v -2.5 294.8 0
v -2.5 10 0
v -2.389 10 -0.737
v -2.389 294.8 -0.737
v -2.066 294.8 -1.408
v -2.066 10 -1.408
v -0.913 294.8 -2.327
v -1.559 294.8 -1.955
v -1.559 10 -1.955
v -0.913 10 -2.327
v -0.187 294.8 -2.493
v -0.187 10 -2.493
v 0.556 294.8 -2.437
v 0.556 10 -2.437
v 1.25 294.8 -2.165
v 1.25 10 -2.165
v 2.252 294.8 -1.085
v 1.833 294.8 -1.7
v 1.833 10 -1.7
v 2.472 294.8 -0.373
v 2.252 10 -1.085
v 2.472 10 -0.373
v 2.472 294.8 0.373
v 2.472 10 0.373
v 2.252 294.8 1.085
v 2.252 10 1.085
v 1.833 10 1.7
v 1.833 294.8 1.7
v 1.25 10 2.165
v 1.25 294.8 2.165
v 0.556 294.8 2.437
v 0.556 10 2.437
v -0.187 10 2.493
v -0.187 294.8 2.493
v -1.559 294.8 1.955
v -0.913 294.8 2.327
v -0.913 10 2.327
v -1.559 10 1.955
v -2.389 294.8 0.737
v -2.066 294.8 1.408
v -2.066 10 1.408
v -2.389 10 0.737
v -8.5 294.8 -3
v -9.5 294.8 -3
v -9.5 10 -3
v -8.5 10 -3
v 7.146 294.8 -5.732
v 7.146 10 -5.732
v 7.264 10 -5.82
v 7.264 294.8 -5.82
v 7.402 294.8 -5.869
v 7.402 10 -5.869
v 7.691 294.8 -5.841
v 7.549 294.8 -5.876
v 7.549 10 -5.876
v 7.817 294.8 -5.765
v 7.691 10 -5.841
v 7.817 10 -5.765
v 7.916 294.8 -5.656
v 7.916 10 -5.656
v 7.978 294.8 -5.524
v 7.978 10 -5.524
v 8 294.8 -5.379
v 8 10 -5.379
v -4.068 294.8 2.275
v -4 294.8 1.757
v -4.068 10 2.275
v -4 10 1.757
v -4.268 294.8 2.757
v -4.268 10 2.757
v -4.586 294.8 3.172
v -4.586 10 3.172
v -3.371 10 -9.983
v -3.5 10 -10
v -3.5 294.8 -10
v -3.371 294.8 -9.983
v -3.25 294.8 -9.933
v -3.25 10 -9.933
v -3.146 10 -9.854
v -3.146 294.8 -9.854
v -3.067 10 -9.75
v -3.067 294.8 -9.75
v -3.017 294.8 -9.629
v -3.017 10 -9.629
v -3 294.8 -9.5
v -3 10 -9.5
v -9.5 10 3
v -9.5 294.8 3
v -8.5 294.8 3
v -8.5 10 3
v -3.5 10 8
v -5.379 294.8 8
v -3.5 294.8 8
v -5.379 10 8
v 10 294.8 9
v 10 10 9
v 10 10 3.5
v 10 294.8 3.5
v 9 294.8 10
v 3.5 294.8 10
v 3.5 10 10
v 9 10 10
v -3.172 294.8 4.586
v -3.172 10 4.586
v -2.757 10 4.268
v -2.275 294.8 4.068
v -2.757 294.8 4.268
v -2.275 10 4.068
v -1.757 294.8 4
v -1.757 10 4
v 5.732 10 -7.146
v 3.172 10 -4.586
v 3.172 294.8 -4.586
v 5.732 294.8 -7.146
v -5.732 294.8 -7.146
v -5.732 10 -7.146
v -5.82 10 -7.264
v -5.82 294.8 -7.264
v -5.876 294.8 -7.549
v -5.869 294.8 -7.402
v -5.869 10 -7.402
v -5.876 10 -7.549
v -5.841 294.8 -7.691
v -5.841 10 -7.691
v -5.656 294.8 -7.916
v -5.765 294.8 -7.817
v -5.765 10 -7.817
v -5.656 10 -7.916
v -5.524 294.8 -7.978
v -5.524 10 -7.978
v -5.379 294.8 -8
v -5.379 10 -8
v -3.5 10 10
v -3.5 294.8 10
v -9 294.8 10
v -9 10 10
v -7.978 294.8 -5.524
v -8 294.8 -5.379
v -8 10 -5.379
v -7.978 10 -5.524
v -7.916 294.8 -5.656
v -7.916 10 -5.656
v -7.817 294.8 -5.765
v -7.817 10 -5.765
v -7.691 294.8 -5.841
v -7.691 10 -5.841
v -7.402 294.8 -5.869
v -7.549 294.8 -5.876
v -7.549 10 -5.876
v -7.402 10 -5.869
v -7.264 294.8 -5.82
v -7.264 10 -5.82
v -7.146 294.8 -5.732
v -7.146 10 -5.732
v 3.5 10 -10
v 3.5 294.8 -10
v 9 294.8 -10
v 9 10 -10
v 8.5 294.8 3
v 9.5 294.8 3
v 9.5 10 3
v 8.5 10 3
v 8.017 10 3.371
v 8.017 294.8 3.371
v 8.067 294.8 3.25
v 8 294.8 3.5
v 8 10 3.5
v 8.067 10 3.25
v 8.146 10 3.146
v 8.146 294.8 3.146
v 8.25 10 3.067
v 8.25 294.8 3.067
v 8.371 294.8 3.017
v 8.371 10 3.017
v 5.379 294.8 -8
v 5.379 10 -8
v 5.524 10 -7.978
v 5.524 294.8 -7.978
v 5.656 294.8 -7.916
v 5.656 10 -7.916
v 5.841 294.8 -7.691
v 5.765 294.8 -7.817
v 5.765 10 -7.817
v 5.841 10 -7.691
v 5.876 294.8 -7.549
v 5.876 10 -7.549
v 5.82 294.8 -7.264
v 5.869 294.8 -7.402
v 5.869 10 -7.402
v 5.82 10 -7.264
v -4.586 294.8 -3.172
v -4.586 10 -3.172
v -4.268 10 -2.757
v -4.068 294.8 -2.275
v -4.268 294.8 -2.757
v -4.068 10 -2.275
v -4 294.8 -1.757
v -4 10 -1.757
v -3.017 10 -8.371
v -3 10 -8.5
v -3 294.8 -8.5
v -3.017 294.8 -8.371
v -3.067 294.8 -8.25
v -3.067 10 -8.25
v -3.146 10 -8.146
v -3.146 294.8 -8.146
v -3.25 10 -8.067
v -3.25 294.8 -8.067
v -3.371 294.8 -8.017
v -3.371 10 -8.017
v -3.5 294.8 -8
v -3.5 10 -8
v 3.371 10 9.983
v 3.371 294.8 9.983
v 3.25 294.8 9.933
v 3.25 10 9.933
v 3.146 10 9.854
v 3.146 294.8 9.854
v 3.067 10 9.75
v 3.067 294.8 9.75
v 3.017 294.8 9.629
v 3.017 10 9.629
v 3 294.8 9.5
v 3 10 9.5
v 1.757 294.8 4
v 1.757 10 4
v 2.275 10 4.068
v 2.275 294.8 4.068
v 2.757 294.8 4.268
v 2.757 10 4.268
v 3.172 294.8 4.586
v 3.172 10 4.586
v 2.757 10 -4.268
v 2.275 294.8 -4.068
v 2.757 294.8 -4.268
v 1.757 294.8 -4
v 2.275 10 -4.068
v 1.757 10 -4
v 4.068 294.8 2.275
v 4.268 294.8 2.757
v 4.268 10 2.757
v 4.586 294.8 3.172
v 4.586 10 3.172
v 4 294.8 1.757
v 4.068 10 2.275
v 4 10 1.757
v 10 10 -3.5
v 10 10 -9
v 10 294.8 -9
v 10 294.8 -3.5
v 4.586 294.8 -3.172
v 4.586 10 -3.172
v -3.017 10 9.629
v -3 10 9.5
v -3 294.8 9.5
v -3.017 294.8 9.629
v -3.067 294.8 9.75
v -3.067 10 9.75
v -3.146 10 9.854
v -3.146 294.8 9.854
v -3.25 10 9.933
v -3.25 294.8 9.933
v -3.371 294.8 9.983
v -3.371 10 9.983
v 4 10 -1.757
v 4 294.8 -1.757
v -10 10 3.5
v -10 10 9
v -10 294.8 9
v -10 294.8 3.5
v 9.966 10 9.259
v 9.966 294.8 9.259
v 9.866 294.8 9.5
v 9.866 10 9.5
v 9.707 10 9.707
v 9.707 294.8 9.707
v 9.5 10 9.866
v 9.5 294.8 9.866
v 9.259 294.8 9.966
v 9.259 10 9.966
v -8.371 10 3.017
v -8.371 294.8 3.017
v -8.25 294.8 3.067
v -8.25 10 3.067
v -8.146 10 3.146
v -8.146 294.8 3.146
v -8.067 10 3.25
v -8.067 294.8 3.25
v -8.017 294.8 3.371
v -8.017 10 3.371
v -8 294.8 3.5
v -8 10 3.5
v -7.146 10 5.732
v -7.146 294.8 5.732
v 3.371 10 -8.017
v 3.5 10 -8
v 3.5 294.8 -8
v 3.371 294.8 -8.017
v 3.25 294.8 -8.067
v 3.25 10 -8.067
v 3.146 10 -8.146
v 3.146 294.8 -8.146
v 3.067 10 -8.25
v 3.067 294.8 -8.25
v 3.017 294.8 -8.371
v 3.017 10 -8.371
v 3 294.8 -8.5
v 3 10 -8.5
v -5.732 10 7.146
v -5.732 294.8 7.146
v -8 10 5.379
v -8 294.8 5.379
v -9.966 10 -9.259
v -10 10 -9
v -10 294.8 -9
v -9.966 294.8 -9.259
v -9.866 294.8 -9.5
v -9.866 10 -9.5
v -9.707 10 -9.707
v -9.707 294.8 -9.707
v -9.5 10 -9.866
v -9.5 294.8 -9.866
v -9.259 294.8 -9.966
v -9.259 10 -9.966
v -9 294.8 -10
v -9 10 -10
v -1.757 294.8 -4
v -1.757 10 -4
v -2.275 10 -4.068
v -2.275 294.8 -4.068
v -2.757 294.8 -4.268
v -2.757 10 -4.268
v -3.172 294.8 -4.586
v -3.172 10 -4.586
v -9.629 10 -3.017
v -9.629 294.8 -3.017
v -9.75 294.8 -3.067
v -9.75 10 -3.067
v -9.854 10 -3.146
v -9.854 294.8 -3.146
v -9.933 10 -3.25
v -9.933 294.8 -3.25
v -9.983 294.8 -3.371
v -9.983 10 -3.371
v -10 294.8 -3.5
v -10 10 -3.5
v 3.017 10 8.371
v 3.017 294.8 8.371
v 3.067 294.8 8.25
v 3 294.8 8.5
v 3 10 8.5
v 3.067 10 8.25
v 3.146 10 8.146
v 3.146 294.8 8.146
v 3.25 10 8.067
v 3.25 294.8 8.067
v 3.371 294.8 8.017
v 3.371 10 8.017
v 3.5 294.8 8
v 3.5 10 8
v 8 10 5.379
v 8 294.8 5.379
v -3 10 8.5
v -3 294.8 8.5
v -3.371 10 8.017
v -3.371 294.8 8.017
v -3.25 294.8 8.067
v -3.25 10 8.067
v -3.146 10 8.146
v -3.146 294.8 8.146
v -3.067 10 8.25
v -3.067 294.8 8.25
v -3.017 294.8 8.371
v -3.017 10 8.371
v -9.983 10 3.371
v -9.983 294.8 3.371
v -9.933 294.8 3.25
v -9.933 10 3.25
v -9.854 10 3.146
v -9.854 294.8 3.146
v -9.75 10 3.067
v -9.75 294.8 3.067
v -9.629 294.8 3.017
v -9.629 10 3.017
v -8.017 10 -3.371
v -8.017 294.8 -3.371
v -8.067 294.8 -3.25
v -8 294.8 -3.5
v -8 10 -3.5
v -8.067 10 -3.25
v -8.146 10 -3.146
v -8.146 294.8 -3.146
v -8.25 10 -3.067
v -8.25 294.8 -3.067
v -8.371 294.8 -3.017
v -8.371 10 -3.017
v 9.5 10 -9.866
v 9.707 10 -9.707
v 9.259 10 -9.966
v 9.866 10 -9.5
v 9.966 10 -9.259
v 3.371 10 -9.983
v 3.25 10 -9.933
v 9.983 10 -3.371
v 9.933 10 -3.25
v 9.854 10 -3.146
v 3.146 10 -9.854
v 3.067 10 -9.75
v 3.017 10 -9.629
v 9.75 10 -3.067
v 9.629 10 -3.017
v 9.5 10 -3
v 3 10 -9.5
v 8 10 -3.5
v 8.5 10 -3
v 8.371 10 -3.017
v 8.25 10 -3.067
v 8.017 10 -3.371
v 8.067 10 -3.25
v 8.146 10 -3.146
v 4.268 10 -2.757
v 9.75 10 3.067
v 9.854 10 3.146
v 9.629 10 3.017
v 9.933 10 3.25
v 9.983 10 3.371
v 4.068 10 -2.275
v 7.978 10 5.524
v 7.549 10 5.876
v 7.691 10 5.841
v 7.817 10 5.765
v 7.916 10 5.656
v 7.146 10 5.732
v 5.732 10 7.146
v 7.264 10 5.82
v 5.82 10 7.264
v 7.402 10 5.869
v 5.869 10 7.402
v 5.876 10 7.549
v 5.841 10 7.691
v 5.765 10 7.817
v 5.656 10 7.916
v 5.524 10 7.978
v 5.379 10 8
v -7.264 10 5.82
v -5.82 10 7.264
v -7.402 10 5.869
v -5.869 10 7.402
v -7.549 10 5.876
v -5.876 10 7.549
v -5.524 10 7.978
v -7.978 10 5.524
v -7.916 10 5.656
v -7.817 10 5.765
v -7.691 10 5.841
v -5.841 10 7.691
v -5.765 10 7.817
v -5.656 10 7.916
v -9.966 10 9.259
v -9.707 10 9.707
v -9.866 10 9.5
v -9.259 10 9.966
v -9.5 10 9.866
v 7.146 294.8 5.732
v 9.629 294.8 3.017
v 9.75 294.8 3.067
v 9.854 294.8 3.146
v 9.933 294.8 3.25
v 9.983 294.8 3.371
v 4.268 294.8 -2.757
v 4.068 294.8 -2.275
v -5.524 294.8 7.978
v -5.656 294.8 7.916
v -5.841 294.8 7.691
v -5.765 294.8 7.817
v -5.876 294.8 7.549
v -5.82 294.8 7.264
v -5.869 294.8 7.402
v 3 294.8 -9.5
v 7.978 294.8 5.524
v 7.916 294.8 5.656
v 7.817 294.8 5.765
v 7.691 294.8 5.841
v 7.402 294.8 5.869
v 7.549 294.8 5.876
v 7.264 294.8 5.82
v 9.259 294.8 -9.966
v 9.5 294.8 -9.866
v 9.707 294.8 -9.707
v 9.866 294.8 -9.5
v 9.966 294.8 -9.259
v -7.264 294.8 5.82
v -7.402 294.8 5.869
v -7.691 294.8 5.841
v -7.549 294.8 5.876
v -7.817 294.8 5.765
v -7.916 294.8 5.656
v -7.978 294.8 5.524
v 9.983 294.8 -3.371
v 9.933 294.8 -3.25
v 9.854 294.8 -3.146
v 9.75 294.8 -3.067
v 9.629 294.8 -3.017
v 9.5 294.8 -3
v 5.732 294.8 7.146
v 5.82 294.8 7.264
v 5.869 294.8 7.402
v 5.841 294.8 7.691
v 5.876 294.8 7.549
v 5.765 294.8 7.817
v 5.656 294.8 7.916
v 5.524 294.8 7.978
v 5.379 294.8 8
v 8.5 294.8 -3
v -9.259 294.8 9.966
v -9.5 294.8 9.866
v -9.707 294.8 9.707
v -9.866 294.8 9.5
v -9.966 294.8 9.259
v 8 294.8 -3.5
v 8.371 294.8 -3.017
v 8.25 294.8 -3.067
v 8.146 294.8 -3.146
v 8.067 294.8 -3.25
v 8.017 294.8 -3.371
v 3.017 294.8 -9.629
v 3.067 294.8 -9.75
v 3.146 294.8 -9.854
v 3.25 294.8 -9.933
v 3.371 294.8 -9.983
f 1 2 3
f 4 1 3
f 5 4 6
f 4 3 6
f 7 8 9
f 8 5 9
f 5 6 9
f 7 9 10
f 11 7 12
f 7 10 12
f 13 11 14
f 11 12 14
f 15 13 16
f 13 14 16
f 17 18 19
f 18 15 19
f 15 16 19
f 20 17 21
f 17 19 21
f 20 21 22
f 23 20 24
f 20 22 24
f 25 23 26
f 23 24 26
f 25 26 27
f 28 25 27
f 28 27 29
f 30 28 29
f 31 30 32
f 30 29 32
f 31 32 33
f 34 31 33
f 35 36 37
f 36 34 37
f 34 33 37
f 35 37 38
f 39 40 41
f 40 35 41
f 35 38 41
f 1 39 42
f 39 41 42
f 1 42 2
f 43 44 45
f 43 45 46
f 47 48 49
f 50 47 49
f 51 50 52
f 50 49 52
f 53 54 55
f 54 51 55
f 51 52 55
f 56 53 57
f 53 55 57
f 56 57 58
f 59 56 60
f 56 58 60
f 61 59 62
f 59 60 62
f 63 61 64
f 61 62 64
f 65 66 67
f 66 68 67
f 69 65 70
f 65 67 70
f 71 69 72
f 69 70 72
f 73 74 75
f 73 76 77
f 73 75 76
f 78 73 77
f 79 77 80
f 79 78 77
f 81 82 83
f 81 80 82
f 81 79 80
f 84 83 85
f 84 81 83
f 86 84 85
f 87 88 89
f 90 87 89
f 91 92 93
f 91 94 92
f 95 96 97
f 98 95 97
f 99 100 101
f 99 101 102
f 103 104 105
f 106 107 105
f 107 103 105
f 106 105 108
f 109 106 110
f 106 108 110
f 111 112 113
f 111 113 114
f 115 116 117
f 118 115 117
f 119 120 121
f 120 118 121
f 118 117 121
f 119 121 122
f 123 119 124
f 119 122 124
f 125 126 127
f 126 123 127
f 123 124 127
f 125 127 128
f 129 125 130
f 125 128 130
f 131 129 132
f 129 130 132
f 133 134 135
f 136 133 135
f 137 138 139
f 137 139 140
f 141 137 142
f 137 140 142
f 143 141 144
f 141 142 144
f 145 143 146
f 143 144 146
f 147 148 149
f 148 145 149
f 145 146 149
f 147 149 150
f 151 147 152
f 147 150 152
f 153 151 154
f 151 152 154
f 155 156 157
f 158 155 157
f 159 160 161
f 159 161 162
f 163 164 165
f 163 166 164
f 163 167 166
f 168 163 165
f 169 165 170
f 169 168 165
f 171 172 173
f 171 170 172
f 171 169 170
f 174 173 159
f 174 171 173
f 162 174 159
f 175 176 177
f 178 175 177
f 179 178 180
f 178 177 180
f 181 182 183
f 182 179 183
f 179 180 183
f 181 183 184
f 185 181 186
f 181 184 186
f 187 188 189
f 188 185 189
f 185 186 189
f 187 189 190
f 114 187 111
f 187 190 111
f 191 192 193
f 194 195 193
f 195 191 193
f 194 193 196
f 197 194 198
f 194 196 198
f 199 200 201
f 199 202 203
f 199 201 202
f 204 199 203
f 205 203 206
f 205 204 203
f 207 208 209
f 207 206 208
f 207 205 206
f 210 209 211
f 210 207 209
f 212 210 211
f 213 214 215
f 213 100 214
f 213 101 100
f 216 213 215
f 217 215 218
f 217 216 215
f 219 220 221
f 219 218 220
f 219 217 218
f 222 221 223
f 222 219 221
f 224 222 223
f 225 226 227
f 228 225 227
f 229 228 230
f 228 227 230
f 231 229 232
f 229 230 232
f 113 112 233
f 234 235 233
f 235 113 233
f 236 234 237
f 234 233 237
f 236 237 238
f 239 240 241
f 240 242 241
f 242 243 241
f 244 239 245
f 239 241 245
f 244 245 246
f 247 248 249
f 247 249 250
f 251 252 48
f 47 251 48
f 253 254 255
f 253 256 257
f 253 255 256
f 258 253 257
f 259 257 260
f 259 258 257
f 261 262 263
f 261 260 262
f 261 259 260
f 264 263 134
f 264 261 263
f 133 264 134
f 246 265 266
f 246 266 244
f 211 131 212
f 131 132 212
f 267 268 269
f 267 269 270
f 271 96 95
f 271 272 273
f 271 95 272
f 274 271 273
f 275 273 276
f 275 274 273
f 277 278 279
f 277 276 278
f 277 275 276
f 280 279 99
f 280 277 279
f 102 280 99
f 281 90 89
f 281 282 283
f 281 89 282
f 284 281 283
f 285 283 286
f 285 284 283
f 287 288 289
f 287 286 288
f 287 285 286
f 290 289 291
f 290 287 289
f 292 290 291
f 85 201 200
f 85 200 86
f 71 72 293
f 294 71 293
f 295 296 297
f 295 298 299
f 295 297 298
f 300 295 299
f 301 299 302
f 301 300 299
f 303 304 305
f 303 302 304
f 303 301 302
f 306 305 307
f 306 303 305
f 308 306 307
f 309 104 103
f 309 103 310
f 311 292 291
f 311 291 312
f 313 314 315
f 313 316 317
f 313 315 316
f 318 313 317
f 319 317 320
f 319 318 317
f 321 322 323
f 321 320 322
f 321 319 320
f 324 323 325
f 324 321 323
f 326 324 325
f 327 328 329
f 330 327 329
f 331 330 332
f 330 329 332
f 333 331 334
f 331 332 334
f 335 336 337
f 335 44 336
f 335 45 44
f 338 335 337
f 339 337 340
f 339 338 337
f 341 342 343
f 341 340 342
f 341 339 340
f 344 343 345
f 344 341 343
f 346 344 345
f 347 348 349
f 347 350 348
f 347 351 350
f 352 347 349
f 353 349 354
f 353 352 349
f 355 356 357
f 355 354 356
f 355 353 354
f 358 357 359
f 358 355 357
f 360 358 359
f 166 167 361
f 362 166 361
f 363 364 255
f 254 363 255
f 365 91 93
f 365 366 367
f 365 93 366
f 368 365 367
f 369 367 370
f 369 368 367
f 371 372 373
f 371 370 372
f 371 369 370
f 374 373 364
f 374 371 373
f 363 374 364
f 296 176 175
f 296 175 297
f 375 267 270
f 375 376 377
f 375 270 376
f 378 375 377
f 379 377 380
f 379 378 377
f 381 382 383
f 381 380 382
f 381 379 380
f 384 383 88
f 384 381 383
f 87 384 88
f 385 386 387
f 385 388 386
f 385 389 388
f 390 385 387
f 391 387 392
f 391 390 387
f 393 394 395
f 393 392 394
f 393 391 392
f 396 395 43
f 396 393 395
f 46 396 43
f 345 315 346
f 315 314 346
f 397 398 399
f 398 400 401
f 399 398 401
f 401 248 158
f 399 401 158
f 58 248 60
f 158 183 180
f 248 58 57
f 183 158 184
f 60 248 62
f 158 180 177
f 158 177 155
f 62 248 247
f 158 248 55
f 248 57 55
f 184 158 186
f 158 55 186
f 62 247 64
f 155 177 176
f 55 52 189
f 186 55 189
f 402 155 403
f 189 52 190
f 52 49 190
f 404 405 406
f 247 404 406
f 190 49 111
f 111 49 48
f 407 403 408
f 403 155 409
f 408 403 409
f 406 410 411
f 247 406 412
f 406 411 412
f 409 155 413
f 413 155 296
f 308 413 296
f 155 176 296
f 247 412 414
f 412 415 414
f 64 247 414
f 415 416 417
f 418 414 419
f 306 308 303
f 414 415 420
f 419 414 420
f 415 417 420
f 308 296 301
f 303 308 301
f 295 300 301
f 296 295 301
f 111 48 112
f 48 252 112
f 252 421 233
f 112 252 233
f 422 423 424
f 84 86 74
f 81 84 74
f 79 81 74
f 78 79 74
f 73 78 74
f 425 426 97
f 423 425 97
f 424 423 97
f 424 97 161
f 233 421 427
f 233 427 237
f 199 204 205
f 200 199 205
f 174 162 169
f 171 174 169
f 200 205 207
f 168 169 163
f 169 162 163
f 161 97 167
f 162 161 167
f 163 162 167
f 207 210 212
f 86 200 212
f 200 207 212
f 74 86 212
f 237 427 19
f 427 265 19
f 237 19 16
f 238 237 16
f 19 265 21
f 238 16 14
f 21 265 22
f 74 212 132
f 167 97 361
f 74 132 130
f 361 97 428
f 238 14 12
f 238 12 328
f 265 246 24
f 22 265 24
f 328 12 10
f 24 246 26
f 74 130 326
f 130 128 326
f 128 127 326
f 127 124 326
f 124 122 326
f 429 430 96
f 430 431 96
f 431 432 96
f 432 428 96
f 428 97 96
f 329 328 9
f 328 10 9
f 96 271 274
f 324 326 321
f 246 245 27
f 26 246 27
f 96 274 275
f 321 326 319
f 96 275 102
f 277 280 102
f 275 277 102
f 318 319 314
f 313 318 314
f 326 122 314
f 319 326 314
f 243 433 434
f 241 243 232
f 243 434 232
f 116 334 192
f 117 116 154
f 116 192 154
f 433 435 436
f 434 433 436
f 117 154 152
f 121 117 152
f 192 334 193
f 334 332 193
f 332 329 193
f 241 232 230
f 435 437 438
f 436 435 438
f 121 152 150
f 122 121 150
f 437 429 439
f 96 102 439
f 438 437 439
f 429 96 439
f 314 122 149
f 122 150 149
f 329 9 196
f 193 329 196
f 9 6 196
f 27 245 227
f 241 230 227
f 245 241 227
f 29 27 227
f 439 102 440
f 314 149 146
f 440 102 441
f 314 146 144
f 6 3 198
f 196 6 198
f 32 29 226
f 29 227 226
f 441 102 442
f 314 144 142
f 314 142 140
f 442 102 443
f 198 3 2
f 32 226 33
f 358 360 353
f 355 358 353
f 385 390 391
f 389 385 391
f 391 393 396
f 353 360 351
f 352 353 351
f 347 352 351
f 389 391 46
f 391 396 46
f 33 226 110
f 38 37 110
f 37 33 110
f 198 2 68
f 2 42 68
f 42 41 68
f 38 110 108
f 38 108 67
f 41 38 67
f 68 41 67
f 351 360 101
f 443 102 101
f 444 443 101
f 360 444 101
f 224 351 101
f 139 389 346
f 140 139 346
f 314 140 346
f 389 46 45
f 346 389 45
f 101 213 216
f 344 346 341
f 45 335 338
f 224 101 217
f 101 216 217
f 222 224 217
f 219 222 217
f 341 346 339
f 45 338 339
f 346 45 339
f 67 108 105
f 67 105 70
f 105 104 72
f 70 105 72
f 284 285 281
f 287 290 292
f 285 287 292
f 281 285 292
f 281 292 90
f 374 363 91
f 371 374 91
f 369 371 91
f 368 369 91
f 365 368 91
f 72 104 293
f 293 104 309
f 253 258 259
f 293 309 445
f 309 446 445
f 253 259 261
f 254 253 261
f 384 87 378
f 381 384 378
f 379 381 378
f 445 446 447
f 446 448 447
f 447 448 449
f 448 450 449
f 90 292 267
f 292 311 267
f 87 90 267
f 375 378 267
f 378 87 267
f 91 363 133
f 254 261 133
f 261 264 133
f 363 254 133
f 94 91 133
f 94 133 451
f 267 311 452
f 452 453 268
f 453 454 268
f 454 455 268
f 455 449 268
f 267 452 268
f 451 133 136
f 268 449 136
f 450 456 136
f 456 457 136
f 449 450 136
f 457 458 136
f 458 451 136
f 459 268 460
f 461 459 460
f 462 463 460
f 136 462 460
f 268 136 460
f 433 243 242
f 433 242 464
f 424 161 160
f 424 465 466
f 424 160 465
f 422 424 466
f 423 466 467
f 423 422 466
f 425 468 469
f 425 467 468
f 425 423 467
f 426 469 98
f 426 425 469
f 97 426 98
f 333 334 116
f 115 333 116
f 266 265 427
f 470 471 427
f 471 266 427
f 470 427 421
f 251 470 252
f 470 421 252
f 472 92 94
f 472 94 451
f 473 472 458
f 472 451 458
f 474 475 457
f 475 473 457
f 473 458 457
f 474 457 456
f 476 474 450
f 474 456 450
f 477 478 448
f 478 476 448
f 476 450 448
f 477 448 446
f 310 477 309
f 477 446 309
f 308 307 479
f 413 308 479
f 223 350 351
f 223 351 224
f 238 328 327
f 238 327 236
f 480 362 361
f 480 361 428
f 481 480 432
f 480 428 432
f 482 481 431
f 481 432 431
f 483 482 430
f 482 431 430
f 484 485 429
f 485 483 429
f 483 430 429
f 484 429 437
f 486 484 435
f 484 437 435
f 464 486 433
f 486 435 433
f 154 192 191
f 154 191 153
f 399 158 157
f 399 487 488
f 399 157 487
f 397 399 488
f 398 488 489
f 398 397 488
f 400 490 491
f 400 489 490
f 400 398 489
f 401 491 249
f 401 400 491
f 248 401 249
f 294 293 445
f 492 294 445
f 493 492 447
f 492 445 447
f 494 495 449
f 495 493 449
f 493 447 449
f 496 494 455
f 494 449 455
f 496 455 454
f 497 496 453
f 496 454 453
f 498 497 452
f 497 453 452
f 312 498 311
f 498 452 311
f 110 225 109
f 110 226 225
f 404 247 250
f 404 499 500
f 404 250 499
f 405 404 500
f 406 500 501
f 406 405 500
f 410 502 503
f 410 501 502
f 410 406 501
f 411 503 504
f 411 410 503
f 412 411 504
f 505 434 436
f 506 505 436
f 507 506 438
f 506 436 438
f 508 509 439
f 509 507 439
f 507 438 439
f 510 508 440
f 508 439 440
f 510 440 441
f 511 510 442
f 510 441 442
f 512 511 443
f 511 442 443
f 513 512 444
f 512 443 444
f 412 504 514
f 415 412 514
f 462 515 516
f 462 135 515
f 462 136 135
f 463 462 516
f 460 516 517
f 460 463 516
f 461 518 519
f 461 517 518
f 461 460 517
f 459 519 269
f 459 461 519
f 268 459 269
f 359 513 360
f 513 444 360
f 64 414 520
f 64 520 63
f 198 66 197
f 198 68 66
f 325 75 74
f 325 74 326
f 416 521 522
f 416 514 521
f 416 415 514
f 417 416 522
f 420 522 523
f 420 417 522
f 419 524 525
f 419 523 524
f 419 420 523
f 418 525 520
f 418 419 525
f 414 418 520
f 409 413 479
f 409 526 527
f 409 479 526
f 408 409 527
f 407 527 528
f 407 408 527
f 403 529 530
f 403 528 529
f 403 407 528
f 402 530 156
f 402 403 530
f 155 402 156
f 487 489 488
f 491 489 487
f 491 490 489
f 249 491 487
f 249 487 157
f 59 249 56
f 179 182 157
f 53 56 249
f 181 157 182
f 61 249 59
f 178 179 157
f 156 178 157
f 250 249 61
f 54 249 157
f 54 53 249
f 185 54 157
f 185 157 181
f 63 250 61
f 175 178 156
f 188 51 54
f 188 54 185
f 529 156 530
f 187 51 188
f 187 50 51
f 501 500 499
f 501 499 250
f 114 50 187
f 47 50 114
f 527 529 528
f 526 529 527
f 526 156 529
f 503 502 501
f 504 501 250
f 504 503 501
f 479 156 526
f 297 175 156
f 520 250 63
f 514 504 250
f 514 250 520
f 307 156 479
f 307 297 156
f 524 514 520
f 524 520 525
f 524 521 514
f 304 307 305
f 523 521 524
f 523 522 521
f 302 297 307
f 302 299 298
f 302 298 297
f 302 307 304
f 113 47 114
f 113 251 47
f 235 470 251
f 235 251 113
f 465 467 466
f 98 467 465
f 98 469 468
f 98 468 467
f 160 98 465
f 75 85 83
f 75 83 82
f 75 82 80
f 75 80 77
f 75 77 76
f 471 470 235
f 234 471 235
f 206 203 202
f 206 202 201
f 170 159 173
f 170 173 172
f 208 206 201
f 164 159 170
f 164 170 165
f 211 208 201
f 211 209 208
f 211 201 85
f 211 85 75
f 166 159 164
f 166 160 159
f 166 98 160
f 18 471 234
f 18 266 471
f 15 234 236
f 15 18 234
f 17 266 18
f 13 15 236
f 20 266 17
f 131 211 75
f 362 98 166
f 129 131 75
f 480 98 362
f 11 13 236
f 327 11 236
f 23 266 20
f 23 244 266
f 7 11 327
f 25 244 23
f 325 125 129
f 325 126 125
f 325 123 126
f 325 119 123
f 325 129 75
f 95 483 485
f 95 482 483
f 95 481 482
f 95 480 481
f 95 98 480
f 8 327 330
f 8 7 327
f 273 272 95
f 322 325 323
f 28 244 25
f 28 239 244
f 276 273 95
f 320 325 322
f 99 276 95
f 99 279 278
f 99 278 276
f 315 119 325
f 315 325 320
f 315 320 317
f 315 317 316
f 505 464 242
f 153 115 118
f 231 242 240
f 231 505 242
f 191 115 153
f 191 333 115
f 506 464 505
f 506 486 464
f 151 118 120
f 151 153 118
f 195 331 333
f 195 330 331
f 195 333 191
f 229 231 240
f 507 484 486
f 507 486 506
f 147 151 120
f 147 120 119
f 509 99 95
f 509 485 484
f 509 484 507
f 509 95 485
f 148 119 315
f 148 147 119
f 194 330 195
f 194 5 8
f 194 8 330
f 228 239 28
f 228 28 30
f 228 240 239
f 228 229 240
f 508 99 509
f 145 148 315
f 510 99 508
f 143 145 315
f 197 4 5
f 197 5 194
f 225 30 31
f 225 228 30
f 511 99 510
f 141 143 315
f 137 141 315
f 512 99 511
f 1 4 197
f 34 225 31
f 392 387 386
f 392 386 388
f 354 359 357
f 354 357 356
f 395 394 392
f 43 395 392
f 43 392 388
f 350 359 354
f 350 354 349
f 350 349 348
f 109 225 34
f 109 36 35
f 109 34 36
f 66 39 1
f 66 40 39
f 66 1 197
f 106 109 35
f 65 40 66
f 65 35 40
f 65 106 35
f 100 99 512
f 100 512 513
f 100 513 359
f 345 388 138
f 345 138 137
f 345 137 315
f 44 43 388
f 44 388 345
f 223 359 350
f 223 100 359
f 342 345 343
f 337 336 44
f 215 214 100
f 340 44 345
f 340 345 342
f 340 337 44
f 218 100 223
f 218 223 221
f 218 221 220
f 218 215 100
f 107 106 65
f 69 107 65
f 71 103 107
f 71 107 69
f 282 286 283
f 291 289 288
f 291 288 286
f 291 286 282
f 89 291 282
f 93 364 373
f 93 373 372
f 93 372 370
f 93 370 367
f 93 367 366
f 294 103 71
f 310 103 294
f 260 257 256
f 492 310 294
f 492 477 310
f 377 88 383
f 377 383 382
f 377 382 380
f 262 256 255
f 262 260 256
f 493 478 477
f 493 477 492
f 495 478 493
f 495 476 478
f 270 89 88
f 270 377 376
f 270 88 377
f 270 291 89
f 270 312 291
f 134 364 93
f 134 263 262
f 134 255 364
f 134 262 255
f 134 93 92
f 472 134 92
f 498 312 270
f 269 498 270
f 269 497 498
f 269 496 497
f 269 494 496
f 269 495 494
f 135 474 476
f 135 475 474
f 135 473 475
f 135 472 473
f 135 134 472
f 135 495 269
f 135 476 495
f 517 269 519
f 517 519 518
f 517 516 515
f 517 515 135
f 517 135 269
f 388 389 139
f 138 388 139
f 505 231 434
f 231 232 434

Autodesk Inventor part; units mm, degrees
ref_plane "Start Plane" through (0, 10, 0) normal (0, 1, 0) x (-1, 0, 0)
ref_plane "End Plane" through (0, 294.8, 0) normal (0, 1, 0) x (-1, 0, 0)
sketch "Sketch" plane through (0, 0, 0) normal (0, 1, 0) x (-1, 0, 0)
  line L0 (-1.7574, 4) -> (1.7574, 4)
  line L1 (4, 1.7574) -> (4, -1.7574)
  line L2 (1.7574, -4) -> (-1.7574, -4)
  line L3 (-4, -1.7574) -> (-4, 1.7574)
  line L4 (4.5858, -3.1716) -> (7.1464, -5.7322)
  line L5 (3.1716, -4.5858) -> (5.7322, -7.1464)
  line L6 (5.3787, -8) -> (3.5, -8)
  line L7 (3, -8.5) -> (3, -9.5)
  line L8 (3.5, -10) -> (9, -10)
  line L9 (10, -9) -> (10, -3.5)
  line L10 (9.5, -3) -> (8.5, -3)
  line L11 (8, -3.5) -> (8, -5.3787)
  line L12 (4, 0) -> (-4, 0) construction
  line L13 (0, -4) -> (0, 4) construction
  arc A0 (4, -1.7574) -> (4.5858, -3.1716) centre (6, -1.7574) ccw
  arc A1 (3.1716, -4.5858) -> (1.7574, -4) centre (1.7574, -6) ccw
  arc A2 (3.5, -8) -> (3, -8.5) centre (3.5, -8.5) ccw
  arc A3 (3, -9.5) -> (3.5, -10) centre (3.5, -9.5) ccw
  arc A4 (10, -3.5) -> (9.5, -3) centre (9.5, -3.5) ccw
  arc A5 (8.5, -3) -> (8, -3.5) centre (8.5, -3.5) ccw
  arc A6 (7.1464, -5.7322) -> (8, -5.3787) centre (7.5, -5.3787) ccw
  arc A7 (5.3787, -8) -> (5.7322, -7.1464) centre (5.3787, -7.5) ccw
  arc A8 (9, -10) -> (10, -9) centre (9, -9) ccw
  line L14 (-4.5858, -3.1716) -> (-7.1464, -5.7322)
  line L15 (-3.1716, -4.5858) -> (-5.7322, -7.1464)
  line L16 (-5.3787, -8) -> (-3.5, -8)
  line L17 (-3, -8.5) -> (-3, -9.5)
  line L18 (-3.5, -10) -> (-9, -10)
  line L19 (-10, -9) -> (-10, -3.5)
  line L20 (-9.5, -3) -> (-8.5, -3)
  line L21 (-8, -3.5) -> (-8, -5.3787)
  arc A9 (-4.5858, -3.1716) -> (-4, -1.7574) centre (-6, -1.7574) ccw
  arc A10 (-1.7574, -4) -> (-3.1716, -4.5858) centre (-1.7574, -6) ccw
  arc A11 (-3, -8.5) -> (-3.5, -8) centre (-3.5, -8.5) ccw
  arc A12 (-3.5, -10) -> (-3, -9.5) centre (-3.5, -9.5) ccw
  arc A13 (-9.5, -3) -> (-10, -3.5) centre (-9.5, -3.5) ccw
  arc A14 (-8, -3.5) -> (-8.5, -3) centre (-8.5, -3.5) ccw
  arc A15 (-8, -5.3787) -> (-7.1464, -5.7322) centre (-7.5, -5.3787) ccw
  arc A16 (-5.7322, -7.1464) -> (-5.3787, -8) centre (-5.3787, -7.5) ccw
  arc A17 (-10, -9) -> (-9, -10) centre (-9, -9) ccw
  line L22 (4.5858, 3.1716) -> (7.1464, 5.7322)
  line L23 (3.1716, 4.5858) -> (5.7322, 7.1464)
  line L24 (5.3787, 8) -> (3.5, 8)
  line L25 (3, 8.5) -> (3, 9.5)
  line L26 (3.5, 10) -> (9, 10)
  line L27 (10, 9) -> (10, 3.5)
  line L28 (9.5, 3) -> (8.5, 3)
  line L29 (8, 3.5) -> (8, 5.3787)
  arc A18 (4.5858, 3.1716) -> (4, 1.7574) centre (6, 1.7574) ccw
  arc A19 (1.7574, 4) -> (3.1716, 4.5858) centre (1.7574, 6) ccw
  arc A20 (3, 8.5) -> (3.5, 8) centre (3.5, 8.5) ccw
  arc A21 (3.5, 10) -> (3, 9.5) centre (3.5, 9.5) ccw
  arc A22 (9.5, 3) -> (10, 3.5) centre (9.5, 3.5) ccw
  arc A23 (8, 3.5) -> (8.5, 3) centre (8.5, 3.5) ccw
  arc A24 (8, 5.3787) -> (7.1464, 5.7322) centre (7.5, 5.3787) ccw
  arc A25 (5.7322, 7.1464) -> (5.3787, 8) centre (5.3787, 7.5) ccw
  arc A26 (10, 9) -> (9, 10) centre (9, 9) ccw
  line L30 (-10, 9) -> (-10, 3.5)
  arc A27 (-9, 10) -> (-10, 9) centre (-9, 9) ccw
  arc A28 (-10, 3.5) -> (-9.5, 3) centre (-9.5, 3.5) ccw
  line L31 (-9.5, 3) -> (-8.5, 3)
  arc A29 (-8.5, 3) -> (-8, 3.5) centre (-8.5, 3.5) ccw
  line L32 (-8, 3.5) -> (-8, 5.3787)
  arc A30 (-7.1464, 5.7322) -> (-8, 5.3787) centre (-7.5, 5.3787) ccw
  line L33 (-4.5858, 3.1716) -> (-7.1464, 5.7322)
  line L34 (-3.1716, 4.5858) -> (-5.7322, 7.1464)
  arc A31 (-3.1716, 4.5858) -> (-1.7574, 4) centre (-1.7574, 6) ccw
  arc A32 (-4, 1.7574) -> (-4.5858, 3.1716) centre (-6, 1.7574) ccw
  arc A33 (-5.3787, 8) -> (-5.7322, 7.1464) centre (-5.3787, 7.5) ccw
  line L35 (-5.3787, 8) -> (-3.5, 8)
  arc A34 (-3.5, 8) -> (-3, 8.5) centre (-3.5, 8.5) ccw
  line L36 (-3, 8.5) -> (-3, 9.5)
  arc A35 (-3, 9.5) -> (-3.5, 10) centre (-3.5, 9.5) ccw
  line L37 (-3.5, 10) -> (-9, 10)
  circle A36 centre (0, 0) radius 2.5
  point P0 (3, -8)
  point P1 (3, -10)
  point P2 (10, -10)
  dimension "d3" = 2
  dimension "d4" = 2
  dimension "d5" = 7
  dimension "d6" = 2
  dimension "d7" = 0.5
  dimension "d8" = 1
  dimension "d9" = 20
  dimension "d10" = 20
  dimension "d11" = 8
  dimension "d13" = 5
  dimension "d14" = 8
extrude "Body" add sketch "Sketch" along normal up to surface (284.8 mm away) from surface at 10
sketch "Sketch4" plane through (0, 0, 0) normal (0, 1, 0) x (-1, 0, 0)
  line L0 (0, 0) -> (10, 0)
ref_plane "Work Plane4" through (0, 0, 0) normal (0, 0, -1) x (-1, 0, 0)
sketch "Sketch5" plane through (0, 0, 0) normal (0, 0, -1) x (-1, 0, 0)
  line L0 (-2, 10) -> (12, 10)
  line L1 (-2, 294.8) -> (12, 294.8)
  dimension "d22" = 284.8
ref_plane "Work Plane5" through (0, 294.8, 3.5) normal (0, 1, 0) x (1, 0, 0)
split "Split1" plane through (0, 294.8, 3.5) removes the side toward (0, 1, 0)
ref_plane "Work Plane6" through (-279.4, 10, 3.5) normal (0, -1, 0) x (1, 0, 0)
split "Split2" plane through (-279.4, 10, 3.5) removes the side toward (0, -1, 0)
equation "\"d18\" = Length + G_OFFSET_END"
equation "\"G_L\" = d22"
equation "\"Length\" = 304.8"
equation "\"G_OFFSET_END\" = -10"
properties part number "A3.3"
